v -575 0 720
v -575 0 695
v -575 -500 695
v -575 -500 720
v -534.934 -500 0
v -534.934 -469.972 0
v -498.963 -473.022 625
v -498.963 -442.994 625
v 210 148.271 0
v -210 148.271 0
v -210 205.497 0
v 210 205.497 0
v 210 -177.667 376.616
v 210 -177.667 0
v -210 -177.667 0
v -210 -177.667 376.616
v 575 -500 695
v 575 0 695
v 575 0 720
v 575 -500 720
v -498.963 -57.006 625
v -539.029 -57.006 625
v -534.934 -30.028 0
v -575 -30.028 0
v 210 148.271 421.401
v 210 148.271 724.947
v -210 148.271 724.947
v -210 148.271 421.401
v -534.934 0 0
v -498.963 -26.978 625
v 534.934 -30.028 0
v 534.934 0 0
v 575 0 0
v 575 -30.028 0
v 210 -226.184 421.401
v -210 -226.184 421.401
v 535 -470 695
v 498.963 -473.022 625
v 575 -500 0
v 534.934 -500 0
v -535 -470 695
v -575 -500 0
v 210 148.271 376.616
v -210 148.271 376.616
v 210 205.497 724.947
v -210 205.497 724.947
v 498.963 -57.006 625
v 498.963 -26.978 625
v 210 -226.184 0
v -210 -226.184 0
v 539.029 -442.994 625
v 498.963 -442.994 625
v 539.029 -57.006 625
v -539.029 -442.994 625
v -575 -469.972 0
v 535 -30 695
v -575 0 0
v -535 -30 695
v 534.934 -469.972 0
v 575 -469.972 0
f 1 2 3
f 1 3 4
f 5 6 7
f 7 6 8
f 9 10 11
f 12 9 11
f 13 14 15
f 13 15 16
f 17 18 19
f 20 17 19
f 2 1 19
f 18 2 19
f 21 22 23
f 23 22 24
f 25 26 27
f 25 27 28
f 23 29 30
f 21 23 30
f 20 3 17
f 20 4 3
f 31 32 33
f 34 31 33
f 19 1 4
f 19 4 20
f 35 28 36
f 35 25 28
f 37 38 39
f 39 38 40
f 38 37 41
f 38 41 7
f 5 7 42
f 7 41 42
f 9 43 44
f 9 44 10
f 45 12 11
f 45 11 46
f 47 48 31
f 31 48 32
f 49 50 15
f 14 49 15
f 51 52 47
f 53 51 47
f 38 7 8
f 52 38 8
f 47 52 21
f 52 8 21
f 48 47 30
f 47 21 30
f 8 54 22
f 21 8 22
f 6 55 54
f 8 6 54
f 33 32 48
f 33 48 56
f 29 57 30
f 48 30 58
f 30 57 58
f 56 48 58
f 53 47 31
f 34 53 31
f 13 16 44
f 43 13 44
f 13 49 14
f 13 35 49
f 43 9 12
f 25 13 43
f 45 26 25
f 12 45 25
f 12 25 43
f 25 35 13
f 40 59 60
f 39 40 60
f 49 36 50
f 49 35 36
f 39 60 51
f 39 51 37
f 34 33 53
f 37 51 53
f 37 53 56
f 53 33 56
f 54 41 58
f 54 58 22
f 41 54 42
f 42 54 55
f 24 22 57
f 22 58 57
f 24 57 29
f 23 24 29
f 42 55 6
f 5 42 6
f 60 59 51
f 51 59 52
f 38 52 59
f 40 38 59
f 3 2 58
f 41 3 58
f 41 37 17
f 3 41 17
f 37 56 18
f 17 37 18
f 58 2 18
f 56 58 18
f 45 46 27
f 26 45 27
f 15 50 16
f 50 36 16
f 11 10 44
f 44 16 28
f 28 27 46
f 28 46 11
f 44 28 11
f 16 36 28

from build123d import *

# Parameters (mm, degrees)
F0_W     = 1150
F0_H     = 720
F1_DEPTH = 500
F3_DEPTH = 500.001
F5_DEPTH = 1150.001
F7_DEPTH = 210


with BuildPart() as f1:
    # F0 (on Front) → F1 (new body)
    with BuildSketch(Plane.XZ):
        with Locations((0, 360)):
            Rectangle(F0_W, F0_H)
    extrude(amount=F1_DEPTH)

    # F2 (on face) → F3 (cut, through all)
    with BuildSketch(Plane(origin=(0, 0, 0), x_dir=(-1, 0, 0), z_dir=(0, 1, 0))):
        Polygon((-617.043245, 718.636699), (-575, 695), (-575, 720), (575, 720), (575, 695), (663.800895, 695), (680.074453, 727.908708), (680.074453, 757.201917), (-617.043245, 757.201917), align=None)
        Polygon((-575, 695), (-575, 0), (-535, 695), align=None)
        Polygon((-498.962583, 625), (-534.933806, 0), (534.933806, 0), (498.962583, 625), align=None)
        Polygon((535, 695), (575, 0), (575, 695), align=None)
    extrude(amount=-F3_DEPTH, mode=Mode.SUBTRACT)

    # F4 (on face) → F5 (cut, through all)
    with BuildSketch(Plane(origin=(-575, 0, 0), x_dir=(0, -1, 0), z_dir=(-1, 0, 0))):
        Polygon((-66.164687, 695), (0, 0), (30, 695), align=None)
        Polygon((470, 695), (500, 0), (521.079004, 695), align=None)
        Polygon((57.006353, 625), (30.027936, 0), (469.972064, 0), (442.993647, 625), align=None)
    extrude(amount=-F5_DEPTH, mode=Mode.SUBTRACT)


with BuildPart() as f7:
    # F6 (on Right) → F7 (new body, symmetric)
    with BuildSketch(Plane.YZ):
        Polygon((-226.184428, 0), (-177.666917, 0), (-177.666917, 376.615703), (148.271248, 376.615703), (148.271248, 0), (205.497026, 0), (205.497026, 724.946558), (148.271248, 724.946558), (148.271248, 421.401083), (-226.184428, 421.401083), align=None)
    extrude(amount=F7_DEPTH, both=True)


solid = Compound([f1.part, f7.part])
